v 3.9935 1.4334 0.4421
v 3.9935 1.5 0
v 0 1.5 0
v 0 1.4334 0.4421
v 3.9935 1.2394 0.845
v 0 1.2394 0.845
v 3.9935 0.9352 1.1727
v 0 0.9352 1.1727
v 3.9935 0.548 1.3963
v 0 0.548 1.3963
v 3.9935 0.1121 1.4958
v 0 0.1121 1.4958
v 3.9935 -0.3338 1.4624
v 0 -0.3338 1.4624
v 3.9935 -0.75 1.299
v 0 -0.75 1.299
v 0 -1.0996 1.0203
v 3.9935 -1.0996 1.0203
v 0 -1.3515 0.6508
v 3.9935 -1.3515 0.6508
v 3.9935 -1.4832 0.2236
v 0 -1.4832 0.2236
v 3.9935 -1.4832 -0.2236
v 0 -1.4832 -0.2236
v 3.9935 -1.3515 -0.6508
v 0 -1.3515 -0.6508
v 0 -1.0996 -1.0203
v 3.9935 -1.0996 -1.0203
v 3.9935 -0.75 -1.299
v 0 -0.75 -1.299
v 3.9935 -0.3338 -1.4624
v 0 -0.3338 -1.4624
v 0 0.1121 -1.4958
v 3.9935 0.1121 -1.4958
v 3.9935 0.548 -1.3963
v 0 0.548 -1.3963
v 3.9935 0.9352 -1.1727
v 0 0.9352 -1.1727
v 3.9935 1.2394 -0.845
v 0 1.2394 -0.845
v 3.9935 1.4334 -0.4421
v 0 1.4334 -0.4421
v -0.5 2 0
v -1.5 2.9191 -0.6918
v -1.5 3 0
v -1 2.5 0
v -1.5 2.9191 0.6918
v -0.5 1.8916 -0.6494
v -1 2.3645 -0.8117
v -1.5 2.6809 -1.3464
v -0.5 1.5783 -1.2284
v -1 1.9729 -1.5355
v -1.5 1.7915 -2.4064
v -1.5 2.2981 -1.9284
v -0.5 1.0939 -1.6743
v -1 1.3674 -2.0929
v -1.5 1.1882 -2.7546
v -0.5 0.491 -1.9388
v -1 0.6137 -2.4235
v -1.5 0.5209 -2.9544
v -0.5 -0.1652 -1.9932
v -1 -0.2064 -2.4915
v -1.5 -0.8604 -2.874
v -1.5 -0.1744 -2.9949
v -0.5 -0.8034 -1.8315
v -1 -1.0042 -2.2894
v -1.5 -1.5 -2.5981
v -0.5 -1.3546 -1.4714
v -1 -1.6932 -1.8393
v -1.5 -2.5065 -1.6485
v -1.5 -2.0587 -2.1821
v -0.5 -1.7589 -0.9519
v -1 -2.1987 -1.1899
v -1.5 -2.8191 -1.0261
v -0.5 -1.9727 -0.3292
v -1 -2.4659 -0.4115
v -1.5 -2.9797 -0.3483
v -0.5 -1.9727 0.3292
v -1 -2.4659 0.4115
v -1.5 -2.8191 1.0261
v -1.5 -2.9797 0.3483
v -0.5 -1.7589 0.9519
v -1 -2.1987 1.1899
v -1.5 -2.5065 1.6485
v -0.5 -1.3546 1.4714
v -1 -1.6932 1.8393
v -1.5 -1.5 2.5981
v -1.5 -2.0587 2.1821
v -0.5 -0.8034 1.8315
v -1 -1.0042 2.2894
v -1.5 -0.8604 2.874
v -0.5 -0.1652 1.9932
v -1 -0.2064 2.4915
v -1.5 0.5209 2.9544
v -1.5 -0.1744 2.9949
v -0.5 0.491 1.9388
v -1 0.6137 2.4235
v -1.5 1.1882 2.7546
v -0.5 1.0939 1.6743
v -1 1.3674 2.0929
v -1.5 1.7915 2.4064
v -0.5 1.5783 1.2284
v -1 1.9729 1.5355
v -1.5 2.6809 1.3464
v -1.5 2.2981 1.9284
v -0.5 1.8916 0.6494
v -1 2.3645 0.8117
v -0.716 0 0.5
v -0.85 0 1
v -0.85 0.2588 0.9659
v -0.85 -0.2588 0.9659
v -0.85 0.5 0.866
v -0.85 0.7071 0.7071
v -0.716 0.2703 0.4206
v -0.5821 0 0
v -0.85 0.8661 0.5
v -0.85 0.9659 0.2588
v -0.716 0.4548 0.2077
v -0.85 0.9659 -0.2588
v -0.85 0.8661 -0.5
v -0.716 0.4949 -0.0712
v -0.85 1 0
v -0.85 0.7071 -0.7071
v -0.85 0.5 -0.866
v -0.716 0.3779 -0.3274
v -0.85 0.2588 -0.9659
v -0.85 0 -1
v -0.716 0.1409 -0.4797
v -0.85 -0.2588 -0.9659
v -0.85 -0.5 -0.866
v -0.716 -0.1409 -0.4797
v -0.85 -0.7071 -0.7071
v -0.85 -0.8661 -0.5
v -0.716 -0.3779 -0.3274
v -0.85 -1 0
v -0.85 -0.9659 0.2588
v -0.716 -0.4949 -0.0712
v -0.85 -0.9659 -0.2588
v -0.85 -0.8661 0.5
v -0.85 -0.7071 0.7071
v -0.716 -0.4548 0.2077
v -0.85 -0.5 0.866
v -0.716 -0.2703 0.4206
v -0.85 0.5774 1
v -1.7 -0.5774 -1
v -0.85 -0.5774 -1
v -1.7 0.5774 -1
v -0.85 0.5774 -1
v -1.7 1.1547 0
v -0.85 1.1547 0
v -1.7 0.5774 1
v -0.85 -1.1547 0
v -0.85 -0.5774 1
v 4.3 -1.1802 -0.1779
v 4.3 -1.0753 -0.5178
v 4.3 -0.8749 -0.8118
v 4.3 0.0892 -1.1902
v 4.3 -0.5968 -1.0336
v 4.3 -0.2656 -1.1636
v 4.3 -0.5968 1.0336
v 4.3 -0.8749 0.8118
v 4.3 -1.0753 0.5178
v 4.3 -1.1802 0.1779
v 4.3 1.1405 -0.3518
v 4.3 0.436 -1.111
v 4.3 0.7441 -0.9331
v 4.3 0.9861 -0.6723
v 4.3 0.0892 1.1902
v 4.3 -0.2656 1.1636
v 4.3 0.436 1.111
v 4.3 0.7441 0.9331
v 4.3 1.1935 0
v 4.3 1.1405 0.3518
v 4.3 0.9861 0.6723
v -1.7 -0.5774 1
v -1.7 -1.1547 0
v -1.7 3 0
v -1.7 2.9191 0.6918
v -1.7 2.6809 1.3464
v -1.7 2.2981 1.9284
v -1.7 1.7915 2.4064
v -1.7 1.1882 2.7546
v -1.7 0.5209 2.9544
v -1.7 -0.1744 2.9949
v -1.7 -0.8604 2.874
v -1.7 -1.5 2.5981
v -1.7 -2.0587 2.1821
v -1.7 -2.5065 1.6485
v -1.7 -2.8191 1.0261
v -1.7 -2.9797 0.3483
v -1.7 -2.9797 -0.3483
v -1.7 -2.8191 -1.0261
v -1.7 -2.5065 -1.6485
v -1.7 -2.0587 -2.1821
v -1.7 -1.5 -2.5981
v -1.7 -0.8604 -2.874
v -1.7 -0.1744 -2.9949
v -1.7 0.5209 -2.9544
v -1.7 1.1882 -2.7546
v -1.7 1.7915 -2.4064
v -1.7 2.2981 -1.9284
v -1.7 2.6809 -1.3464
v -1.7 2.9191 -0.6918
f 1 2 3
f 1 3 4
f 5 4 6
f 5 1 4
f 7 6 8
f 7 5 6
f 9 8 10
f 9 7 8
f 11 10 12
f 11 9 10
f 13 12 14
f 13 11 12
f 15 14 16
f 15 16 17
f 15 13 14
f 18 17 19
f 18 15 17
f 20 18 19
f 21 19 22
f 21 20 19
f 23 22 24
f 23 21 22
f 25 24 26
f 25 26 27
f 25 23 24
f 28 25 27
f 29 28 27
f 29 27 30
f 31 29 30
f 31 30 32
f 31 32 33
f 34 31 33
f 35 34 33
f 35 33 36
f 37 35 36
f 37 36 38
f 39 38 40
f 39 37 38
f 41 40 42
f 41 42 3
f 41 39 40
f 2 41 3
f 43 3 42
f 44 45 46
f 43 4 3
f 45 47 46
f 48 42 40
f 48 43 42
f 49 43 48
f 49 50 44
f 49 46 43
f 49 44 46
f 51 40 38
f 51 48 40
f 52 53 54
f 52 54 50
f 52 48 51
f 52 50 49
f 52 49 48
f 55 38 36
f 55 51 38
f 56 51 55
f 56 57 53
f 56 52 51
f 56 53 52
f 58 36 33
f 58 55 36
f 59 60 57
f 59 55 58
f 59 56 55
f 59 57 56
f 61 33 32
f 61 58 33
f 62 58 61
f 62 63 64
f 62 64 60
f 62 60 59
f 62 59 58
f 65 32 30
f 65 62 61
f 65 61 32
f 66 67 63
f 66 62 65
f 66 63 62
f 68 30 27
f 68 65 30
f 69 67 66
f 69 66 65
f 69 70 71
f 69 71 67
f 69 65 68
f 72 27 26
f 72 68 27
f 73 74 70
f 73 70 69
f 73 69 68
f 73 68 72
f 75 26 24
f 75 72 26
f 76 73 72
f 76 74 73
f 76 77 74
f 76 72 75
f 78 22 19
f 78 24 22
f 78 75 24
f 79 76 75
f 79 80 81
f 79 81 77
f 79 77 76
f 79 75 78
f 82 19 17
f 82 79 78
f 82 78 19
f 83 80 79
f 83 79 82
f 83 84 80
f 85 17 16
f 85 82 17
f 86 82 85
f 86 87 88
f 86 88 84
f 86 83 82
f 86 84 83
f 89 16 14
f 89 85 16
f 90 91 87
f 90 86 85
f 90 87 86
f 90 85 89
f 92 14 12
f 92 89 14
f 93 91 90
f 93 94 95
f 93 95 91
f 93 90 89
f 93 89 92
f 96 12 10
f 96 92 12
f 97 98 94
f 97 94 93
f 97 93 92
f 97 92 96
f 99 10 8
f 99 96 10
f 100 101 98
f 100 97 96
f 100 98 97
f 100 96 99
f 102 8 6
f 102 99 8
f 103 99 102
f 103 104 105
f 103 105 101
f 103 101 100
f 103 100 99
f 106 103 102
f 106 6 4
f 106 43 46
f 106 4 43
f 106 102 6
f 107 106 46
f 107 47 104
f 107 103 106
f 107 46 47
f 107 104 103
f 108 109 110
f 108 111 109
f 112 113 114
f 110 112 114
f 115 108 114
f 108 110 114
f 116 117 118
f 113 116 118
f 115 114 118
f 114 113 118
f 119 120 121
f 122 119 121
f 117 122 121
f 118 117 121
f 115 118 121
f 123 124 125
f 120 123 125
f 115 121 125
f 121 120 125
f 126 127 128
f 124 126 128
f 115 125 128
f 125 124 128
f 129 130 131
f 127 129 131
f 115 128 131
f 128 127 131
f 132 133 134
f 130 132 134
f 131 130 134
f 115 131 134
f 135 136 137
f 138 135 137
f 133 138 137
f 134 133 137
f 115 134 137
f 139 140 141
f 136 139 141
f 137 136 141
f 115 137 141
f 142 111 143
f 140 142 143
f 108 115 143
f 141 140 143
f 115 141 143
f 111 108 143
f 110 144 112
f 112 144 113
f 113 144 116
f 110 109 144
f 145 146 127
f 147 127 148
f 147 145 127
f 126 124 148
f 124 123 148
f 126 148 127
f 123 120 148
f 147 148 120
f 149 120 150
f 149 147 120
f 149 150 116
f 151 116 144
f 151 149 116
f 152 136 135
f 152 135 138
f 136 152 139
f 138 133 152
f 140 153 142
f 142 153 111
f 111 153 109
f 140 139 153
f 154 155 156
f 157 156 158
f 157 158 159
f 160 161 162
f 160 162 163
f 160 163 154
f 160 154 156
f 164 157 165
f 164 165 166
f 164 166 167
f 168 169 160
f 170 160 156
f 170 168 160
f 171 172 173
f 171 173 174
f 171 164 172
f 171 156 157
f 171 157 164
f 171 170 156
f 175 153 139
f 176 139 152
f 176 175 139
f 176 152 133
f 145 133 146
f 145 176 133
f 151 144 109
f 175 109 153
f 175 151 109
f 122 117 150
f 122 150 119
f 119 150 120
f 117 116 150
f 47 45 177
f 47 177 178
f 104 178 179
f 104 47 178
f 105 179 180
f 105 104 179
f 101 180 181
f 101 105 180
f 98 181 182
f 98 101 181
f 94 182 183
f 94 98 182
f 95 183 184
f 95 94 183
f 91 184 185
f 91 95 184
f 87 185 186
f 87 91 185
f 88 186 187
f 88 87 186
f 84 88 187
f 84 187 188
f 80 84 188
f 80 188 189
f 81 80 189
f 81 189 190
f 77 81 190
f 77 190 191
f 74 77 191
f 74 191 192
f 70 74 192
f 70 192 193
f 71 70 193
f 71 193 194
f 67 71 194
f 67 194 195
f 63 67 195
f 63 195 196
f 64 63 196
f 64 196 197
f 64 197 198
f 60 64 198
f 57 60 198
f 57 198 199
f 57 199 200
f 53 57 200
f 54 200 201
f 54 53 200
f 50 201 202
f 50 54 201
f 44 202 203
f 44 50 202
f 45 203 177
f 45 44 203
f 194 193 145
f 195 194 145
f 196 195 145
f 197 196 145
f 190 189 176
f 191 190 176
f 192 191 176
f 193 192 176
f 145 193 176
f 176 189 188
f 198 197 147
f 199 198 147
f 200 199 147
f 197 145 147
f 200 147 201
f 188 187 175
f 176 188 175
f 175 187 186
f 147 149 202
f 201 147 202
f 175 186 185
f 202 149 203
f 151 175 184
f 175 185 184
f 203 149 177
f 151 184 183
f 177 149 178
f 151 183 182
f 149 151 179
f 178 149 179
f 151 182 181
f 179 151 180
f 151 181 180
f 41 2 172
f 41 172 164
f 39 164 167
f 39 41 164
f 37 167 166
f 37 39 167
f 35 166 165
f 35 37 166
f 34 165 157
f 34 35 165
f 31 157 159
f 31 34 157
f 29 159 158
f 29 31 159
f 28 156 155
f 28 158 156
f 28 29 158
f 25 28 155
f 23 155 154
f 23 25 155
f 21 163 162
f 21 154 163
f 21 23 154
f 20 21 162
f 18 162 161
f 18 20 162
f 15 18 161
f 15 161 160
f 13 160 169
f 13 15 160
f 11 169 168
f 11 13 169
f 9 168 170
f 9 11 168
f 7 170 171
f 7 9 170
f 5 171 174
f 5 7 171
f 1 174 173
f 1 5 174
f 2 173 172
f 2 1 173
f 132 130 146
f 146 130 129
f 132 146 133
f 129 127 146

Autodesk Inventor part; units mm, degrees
sketch "Sketch_1" plane through (0, 0, 0) normal (0, 0, 1) x (1, 0, 0)
  line L0 (4.3, 0) -> (0, 0)
  line L1 (-1.7, 0) -> (-1.7, 3)
  line L2 (-1.7, 3) -> (-1.5, 3)
  line L3 (-1.5, 3) -> (0, 1.5)
  line L4 (0, 1.5) -> (3.9935, 1.5)
  line L5 (3.9935, 1.5) -> (4.3, 1.1935)
  line L6 (4.3, 1.1935) -> (4.3, 0)
  line L7 (4.3, 0) -> (-1.7, 0)
revolve "Revolution1" add sketch "Sketch_1" angle 360 about axis through (4.3, 0, 0) along (1, 0, 0)
thread "Thread1" size "M3x0.5" class "6g" standard "ISO Metric profile" length 3.4935
sketch "Sketch2" plane through (-1.7, 0, 0) normal (-1, 0, 0) x (0, 0, 1)
  point P0 (0, 0)
hole "Hole1" at (-1.7, 0, 0) direction (1, 0, 0) diameter 2 depth 0.85 tip angle 150
sketch "Sketch_3" plane through (-1.7, 0, 0) normal (1, 0, 0) x (0, 0, -1)
  line L0 (-1, -0.5774) -> (0, -1.1547)
  line L1 (0, -1.1547) -> (1, -0.5774)
  line L2 (1, -0.5774) -> (1, 0.5774)
  line L3 (1, 0.5774) -> (0, 1.1547)
  line L4 (0, 1.1547) -> (-1, 0.5774)
  line L5 (-1, 0.5774) -> (-1, -0.5774)
extrude "Extrusion1" cut sketch "Sketch_3" along normal blind 0.85
ref_plane "bolt_to_nut_XY" through (4.3, 0, 0) normal (1, 0, 0) x (0, 0, -1)
ref_plane "bolt_to_nut_YZ" through (4.3, 0, 0) normal (0, 0, -1) x (0, 1, 0)
ref_plane "bolt_to_nut_ZX" through (4.3, 0, 0) normal (0, 1, 0) x (1, 0, 0)
ref_plane "dummy_to_bolt_XY" through (0, 0, 0) normal (1, 0, 0) x (0, 0, -1)
ref_plane "dummy_to_bolt_YZ" through (0, 0, 0) normal (0, 0, -1) x (0, 1, 0)
ref_plane "dummy_to_bolt_ZX" through (0, 0, 0) normal (0, 1, 0) x (1, 0, 0)
properties part number "HFBCM3-6"
